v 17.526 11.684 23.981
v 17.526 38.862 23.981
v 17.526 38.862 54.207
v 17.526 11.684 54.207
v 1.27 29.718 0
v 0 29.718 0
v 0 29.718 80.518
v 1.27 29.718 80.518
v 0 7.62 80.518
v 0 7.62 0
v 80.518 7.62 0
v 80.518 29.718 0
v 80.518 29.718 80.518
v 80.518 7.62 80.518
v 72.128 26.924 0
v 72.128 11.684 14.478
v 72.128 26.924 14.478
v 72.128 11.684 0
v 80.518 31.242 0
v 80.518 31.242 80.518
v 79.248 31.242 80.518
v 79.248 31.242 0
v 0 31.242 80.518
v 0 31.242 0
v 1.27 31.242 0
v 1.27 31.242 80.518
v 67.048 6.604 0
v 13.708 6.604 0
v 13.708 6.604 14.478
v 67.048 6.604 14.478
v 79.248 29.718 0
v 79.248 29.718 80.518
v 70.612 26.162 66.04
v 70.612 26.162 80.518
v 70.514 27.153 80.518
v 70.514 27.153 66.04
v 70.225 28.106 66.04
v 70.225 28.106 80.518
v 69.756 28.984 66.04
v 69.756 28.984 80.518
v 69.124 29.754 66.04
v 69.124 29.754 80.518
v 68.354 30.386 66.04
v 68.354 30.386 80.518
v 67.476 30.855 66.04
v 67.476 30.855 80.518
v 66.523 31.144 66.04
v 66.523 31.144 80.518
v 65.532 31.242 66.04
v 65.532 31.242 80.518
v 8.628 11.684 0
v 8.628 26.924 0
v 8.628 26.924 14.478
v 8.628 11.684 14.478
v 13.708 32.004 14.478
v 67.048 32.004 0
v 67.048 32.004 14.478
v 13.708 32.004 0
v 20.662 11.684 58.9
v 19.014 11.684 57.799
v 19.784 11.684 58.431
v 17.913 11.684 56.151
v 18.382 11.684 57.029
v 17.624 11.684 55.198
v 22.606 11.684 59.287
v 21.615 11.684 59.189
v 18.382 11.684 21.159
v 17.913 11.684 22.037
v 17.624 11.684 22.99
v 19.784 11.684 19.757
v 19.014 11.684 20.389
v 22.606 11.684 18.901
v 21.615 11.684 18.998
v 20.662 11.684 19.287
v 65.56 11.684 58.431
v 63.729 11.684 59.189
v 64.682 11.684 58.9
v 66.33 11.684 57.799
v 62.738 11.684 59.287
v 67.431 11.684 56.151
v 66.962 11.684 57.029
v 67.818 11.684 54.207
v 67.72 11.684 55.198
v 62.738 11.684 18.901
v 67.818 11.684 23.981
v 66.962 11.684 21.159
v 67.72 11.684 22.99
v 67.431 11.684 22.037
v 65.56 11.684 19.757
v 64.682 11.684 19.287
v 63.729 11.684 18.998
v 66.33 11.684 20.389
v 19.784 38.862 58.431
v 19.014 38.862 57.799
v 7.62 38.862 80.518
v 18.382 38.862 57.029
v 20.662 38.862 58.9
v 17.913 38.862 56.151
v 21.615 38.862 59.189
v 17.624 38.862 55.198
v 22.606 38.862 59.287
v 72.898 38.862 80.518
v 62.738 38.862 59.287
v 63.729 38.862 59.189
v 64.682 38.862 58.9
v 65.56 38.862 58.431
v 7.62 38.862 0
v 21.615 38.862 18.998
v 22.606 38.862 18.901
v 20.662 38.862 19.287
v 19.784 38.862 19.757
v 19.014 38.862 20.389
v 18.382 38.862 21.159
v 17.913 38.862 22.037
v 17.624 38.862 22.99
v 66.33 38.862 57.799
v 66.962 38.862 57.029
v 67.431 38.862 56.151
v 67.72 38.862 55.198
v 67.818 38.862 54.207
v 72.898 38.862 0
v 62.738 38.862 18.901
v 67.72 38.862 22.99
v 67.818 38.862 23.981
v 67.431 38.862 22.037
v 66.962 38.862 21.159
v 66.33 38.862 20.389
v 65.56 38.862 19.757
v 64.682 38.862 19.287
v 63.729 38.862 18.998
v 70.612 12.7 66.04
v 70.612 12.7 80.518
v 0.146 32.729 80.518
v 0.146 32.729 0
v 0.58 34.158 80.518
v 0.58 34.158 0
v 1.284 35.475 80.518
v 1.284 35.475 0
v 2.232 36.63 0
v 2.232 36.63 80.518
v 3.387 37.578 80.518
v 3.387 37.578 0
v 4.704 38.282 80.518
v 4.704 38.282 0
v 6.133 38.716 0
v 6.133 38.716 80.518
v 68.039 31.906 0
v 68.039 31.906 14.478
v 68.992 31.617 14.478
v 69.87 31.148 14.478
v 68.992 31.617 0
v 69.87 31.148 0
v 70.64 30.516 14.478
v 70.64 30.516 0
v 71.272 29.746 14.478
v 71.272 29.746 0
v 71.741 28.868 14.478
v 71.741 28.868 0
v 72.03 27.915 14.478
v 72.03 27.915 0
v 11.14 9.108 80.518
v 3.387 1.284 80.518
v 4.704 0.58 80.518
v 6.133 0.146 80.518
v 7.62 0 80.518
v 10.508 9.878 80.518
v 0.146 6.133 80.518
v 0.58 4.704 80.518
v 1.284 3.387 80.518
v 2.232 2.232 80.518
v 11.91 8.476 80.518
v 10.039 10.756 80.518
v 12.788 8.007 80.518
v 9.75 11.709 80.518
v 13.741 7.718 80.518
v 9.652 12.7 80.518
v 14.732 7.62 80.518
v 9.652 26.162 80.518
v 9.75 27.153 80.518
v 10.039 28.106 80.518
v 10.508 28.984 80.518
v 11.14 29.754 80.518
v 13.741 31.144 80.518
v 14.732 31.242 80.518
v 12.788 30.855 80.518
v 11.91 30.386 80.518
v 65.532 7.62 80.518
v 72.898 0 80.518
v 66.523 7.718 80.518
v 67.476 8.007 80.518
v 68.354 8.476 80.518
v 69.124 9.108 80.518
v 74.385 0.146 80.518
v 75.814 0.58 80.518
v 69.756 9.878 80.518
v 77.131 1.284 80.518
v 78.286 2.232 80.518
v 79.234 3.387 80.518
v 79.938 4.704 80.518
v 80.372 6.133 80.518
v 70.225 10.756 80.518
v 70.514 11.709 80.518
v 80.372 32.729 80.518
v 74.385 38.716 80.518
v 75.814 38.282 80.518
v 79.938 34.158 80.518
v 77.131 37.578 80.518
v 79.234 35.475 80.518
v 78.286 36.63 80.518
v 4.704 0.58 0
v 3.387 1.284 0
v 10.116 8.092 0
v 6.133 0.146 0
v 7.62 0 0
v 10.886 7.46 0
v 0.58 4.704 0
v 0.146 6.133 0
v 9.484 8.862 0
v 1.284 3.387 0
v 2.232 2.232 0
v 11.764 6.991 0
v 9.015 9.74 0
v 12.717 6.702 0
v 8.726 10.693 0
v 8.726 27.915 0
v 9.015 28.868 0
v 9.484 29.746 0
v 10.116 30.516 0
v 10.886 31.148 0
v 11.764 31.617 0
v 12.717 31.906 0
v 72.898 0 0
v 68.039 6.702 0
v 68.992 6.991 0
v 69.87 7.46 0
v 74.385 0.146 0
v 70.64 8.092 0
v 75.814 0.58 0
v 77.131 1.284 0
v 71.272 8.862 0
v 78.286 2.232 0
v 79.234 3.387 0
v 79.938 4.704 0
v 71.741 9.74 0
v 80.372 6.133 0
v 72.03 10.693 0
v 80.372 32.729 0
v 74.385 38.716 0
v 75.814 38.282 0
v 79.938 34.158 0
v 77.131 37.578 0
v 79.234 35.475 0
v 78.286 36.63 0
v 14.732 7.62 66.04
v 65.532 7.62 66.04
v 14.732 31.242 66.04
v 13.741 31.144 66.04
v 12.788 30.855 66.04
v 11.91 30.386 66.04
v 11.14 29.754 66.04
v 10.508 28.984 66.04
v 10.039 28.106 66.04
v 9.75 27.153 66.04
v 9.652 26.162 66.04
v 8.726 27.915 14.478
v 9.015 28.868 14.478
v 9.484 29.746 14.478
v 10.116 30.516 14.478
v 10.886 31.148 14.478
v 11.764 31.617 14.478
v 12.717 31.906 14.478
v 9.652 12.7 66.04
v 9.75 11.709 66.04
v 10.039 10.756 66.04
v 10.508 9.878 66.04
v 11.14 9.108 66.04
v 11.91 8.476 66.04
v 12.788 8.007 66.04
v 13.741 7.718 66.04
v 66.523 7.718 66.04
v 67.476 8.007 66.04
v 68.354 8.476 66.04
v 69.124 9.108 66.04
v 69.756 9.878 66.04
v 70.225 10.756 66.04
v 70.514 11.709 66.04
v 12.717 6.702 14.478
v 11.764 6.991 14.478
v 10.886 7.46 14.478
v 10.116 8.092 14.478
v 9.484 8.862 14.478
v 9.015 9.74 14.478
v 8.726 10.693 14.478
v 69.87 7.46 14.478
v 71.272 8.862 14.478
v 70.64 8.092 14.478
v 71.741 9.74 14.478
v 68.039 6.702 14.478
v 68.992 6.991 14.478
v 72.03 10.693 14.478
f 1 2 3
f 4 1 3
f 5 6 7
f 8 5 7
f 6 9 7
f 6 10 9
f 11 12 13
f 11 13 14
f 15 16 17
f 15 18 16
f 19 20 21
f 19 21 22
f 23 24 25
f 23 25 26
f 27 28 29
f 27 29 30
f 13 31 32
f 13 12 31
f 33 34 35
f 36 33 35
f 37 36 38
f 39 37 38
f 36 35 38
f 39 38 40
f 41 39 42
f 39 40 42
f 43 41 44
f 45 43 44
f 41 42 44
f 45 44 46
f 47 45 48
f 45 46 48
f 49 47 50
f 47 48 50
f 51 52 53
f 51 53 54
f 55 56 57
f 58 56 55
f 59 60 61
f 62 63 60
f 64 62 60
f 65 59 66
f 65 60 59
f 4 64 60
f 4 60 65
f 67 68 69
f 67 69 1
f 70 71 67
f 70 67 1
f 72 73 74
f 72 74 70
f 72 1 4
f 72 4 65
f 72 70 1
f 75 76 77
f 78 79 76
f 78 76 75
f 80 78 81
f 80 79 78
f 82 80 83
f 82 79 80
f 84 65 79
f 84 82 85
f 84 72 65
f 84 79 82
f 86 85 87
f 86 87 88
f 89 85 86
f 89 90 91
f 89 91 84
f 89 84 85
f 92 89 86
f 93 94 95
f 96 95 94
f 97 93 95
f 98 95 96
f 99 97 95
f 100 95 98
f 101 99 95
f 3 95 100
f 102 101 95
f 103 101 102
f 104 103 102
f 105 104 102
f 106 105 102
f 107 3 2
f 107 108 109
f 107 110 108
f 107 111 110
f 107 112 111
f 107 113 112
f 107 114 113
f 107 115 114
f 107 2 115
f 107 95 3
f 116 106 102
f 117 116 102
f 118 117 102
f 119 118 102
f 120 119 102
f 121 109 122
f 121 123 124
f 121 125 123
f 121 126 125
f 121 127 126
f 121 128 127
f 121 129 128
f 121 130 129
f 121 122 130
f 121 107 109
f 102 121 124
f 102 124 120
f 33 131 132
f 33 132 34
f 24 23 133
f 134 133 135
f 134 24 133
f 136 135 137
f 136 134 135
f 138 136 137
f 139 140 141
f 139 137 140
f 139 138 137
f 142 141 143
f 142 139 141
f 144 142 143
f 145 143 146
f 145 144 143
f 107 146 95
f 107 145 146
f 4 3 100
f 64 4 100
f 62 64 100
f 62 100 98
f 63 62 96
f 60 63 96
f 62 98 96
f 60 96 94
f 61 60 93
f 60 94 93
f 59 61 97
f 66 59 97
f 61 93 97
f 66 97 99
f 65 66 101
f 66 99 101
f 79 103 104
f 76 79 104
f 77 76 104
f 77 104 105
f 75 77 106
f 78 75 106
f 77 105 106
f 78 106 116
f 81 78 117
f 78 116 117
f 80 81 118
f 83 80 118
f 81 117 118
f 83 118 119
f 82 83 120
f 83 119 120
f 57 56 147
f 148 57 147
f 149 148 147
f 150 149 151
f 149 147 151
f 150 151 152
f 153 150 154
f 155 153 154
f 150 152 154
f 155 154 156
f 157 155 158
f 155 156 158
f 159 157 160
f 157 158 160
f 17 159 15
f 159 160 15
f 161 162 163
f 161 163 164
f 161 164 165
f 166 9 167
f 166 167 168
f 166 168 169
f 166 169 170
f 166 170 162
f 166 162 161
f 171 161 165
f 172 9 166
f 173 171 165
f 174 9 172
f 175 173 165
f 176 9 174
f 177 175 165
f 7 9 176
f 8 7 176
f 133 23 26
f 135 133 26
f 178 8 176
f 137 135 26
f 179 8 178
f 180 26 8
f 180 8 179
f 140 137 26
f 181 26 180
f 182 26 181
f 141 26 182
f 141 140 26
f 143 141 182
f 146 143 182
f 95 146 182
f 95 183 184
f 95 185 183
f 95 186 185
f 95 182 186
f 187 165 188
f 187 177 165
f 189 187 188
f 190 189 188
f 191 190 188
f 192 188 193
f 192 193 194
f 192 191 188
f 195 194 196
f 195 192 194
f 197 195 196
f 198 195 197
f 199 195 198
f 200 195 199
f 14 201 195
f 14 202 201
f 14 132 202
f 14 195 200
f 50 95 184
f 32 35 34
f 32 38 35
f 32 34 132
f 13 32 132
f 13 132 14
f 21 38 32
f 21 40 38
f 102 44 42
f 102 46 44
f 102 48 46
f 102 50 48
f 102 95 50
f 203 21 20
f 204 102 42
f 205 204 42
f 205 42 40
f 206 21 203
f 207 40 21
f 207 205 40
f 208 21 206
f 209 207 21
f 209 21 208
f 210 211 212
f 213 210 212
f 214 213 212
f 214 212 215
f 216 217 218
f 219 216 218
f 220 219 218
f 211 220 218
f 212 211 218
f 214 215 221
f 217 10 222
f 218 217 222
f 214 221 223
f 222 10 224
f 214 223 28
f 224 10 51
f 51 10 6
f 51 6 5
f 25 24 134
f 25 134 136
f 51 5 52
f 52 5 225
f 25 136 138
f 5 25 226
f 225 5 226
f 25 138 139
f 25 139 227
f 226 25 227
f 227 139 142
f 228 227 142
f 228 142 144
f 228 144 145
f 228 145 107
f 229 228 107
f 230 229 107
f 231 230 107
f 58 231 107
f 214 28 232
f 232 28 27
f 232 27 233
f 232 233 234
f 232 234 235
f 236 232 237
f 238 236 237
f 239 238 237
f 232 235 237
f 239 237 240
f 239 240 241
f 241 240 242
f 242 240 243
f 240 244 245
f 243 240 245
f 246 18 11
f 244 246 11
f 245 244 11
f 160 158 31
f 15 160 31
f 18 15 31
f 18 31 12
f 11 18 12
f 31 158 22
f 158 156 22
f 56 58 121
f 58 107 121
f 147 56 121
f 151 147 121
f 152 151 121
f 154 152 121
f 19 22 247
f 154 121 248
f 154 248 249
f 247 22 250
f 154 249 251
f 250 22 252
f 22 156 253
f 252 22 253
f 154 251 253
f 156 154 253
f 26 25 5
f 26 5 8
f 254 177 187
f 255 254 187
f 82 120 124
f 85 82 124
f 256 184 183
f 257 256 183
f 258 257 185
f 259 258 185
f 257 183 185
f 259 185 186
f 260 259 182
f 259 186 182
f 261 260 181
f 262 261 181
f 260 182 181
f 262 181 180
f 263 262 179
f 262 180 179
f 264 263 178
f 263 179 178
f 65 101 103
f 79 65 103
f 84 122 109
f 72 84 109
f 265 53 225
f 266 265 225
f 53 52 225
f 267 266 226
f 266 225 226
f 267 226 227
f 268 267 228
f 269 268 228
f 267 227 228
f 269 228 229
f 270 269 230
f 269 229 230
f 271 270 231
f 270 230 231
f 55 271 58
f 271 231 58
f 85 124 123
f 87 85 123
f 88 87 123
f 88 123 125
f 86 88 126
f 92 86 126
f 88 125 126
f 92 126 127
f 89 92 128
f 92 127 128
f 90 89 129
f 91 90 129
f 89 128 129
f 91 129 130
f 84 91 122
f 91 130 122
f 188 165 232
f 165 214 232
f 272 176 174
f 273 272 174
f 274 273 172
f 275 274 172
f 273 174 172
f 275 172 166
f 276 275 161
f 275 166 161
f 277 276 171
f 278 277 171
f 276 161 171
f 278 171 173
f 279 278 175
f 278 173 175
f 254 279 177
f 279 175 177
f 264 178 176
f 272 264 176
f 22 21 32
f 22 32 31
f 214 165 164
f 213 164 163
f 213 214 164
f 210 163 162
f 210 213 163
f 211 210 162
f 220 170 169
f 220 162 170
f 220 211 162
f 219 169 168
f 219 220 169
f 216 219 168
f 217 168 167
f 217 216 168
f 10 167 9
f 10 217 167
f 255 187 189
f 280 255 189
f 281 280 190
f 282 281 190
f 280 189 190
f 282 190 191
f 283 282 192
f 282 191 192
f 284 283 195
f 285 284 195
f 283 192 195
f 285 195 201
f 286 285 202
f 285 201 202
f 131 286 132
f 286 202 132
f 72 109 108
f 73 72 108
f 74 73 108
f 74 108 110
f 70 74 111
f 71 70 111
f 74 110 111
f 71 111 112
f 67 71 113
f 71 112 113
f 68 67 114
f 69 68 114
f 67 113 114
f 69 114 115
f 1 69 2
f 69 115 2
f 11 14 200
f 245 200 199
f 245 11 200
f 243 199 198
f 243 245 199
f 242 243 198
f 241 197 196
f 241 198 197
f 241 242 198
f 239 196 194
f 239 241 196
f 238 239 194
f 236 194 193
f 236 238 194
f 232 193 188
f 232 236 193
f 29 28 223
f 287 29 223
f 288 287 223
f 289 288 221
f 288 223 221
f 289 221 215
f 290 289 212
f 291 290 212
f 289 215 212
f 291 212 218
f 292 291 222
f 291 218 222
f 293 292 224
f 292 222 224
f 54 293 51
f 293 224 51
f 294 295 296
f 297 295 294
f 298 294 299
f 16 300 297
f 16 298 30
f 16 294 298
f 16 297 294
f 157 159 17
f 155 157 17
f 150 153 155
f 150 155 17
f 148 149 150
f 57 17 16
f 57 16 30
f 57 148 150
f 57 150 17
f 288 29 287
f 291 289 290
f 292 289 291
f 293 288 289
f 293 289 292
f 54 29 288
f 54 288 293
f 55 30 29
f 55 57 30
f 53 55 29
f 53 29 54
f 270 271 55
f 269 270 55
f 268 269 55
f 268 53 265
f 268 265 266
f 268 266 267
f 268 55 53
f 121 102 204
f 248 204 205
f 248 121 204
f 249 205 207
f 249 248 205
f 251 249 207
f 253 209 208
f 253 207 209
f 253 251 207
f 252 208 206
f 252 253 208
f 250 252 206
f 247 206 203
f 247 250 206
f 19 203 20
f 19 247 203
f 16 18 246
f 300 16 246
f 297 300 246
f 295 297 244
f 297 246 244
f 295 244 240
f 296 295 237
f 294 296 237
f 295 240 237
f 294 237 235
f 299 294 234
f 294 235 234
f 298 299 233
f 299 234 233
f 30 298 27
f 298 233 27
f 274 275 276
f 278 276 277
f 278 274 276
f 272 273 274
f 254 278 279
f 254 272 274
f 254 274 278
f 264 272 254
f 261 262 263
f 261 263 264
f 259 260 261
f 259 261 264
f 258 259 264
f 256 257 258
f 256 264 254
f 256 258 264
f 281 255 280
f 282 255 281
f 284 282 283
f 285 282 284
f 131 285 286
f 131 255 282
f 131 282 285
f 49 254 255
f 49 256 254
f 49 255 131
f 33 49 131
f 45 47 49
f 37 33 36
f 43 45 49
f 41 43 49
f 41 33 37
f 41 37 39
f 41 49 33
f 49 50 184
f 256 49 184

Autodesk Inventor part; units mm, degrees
ref_plane "YZ Plane" through (0, 0, 0) normal (1, 0, 0) x (0, 1, 0)
ref_plane "XZ Plane" through (0, 0, 0) normal (0, 1, 0) x (-1, 0, 0)
ref_plane "XY Plane" through (0, 0, 0) normal (0, 0, 1) x (1, 0, 0)
sketch "Sketch1" plane through (0, 0, 0) normal (0, 0, 1) x (1, 0, 0)
  line L0 (7.62, 0) -> (72.898, 0)
  line L1 (0, 7.62) -> (0, 31.242)
  line L2 (7.62, 38.862) -> (72.898, 38.862)
  line L3 (80.518, 31.242) -> (80.518, 7.62)
  arc A0 (7.62, 38.862) -> (0, 31.242) centre (7.62, 31.242) ccw
  arc A1 (80.518, 31.242) -> (72.898, 38.862) centre (72.898, 31.242) ccw
  arc A2 (72.898, 0) -> (80.518, 7.62) centre (72.898, 7.62) ccw
  arc A3 (0, 7.62) -> (7.62, 0) centre (7.62, 7.62) ccw
  point P0 (0, 0)
  point P1 (80.518, 0)
  point P2 (0, 38.862)
  dimension "d2" = 80.518
  dimension "d3" = 38.862
  dimension "d4" = 7.62
  dimension "d5" = 7.62
  dimension "d6" = 7.62
  dimension "d7" = 7.62
extrude "Extrusion1" add sketch "Sketch1" along normal blind 80.518
sketch "Sketch2" plane through (0, 0, 80.518) normal (0, 0, 1) x (1, 0, 0)
  line L0 (14.732, 7.62) -> (65.532, 7.62)
  line L1 (70.612, 12.7) -> (70.612, 26.162)
  line L2 (65.532, 31.242) -> (14.732, 31.242)
  line L3 (9.652, 26.162) -> (9.652, 12.7)
  arc A0 (14.732, 31.242) -> (9.652, 26.162) centre (14.732, 26.162) ccw
  arc A1 (70.612, 26.162) -> (65.532, 31.242) centre (65.532, 26.162) ccw
  arc A2 (65.532, 7.62) -> (70.612, 12.7) centre (65.532, 12.7) ccw
  arc A3 (9.652, 12.7) -> (14.732, 7.62) centre (14.732, 12.7) ccw
  point P0 (0, 0)
  point P1 (9.652, 7.62)
  point P2 (70.612, 7.62)
  point P3 (70.612, 31.242)
  dimension "d12" = 60.96
  dimension "d13" = 23.622
  dimension "d16" = 5.08
extrude "Extrusion2" cut sketch "Sketch2" against normal blind 14.478
sketch "Sketch3" plane through (7.62, 38.862, 0) normal (0, 1, 0) x (1, 0, 0)
  line L0 (60.198, -54.2068) -> (60.198, -23.9808)
  line L1 (55.118, -18.9008) -> (14.986, -18.9008)
  line L2 (9.906, -23.9808) -> (9.906, -54.2068)
  line L3 (14.986, -59.2868) -> (55.118, -59.2868)
  line L4 (72.898, 0) -> (72.898, -80.518) projected
  arc A0 (14.986, -18.9008) -> (9.906, -23.9808) centre (14.986, -23.9808) ccw
  arc A1 (60.198, -23.9808) -> (55.118, -18.9008) centre (55.118, -23.9808) ccw
  arc A2 (55.118, -59.2868) -> (60.198, -54.2068) centre (55.118, -54.2068) ccw
  arc A3 (9.906, -54.2068) -> (14.986, -59.2868) centre (14.986, -54.2068) ccw
  point P0 (-7.62, 0)
  point P1 (60.198, -59.2868)
  point P2 (60.198, -18.9008)
  point P3 (9.906, -18.9008)
  point P4 (9.906, -59.2868)
  dimension "d19" = 40.386
  dimension "d20" = 50.292
  dimension "d21" = 12.7
  dimension "d33" = 5.08
extrude "Extrusion3" cut sketch "Sketch3" against normal blind 27.178
sketch "Sketch4" plane through (0, 0, 0) normal (0, 0, -1) x (-1, 0, 0)
  line L0 (-8.6279, 26.924) -> (-8.6279, 11.684)
  line L1 (-72.1279, 11.684) -> (-72.1279, 26.924)
  line L2 (-67.0479, 32.004) -> (-13.7079, 32.004)
  line L3 (-13.7079, 6.604) -> (-67.0479, 6.604)
  arc A0 (-67.0479, 32.004) -> (-72.1279, 26.924) centre (-67.0479, 26.924) ccw
  arc A1 (-8.6279, 26.924) -> (-13.7079, 32.004) centre (-13.7079, 26.924) ccw
  arc A2 (-13.7079, 6.604) -> (-8.6279, 11.684) centre (-13.7079, 11.684) ccw
  arc A3 (-72.1279, 11.684) -> (-67.0479, 6.604) centre (-67.0479, 11.684) ccw
  point P0 (0, 0)
  point P1 (-8.6279, 32.004)
  point P2 (-8.6279, 6.604)
  point P3 (-72.1279, 6.604)
  point P4 (-72.1279, 32.004)
  dimension "d26" = 25.4
  dimension "d27" = 63.5
  dimension "d29" = 25.4
  dimension "d30" = 5.08
extrude "Extrusion4" cut sketch "Sketch4" against normal blind 14.478
sketch "Sketch5" plane through (80.518, 7.62, 0) normal (1, 0, 0) x (0, 0, -1)
  line L0 (-80.518, 23.622) -> (0, 23.622)
  line L1 (0, 23.622) -> (-80.518, 23.622) projected
  line L2 (0, 23.622) -> (0, 22.098)
  line L3 (0, 22.098) -> (-80.518, 22.098)
  line L4 (-80.518, 23.622) -> (-66.04, 23.622) projected
  line L5 (-80.518, 22.098) -> (-80.518, 23.622)
  line L6 (-80.518, 23.622) -> (-80.518, 22.098)
  point P0 (0, -7.62)
  dimension "d34" = 1.524
extrude "Extrusion5" cut sketch "Sketch5" against normal blind 1.27
sketch "Sketch6" plane through (0, 7.62, 0) normal (-1, 0, 0) x (0, 0, 1)
  line L0 (0, 23.622) -> (0, 22.098) projected
  line L1 (0, 23.622) -> (80.518, 23.622)
  line L2 (0, 22.098) -> (80.518, 22.098) projected
  line L3 (80.518, 23.622) -> (80.518, 22.098)
  line L4 (80.518, 22.098) -> (0, 22.098)
  line L5 (0, 22.098) -> (0, 23.622)
  point P0 (0, -7.62)
extrude "Extrusion6" cut sketch "Sketch6" against normal blind 1.27
properties part number "Body EM'" material "Wood (Birch)"
